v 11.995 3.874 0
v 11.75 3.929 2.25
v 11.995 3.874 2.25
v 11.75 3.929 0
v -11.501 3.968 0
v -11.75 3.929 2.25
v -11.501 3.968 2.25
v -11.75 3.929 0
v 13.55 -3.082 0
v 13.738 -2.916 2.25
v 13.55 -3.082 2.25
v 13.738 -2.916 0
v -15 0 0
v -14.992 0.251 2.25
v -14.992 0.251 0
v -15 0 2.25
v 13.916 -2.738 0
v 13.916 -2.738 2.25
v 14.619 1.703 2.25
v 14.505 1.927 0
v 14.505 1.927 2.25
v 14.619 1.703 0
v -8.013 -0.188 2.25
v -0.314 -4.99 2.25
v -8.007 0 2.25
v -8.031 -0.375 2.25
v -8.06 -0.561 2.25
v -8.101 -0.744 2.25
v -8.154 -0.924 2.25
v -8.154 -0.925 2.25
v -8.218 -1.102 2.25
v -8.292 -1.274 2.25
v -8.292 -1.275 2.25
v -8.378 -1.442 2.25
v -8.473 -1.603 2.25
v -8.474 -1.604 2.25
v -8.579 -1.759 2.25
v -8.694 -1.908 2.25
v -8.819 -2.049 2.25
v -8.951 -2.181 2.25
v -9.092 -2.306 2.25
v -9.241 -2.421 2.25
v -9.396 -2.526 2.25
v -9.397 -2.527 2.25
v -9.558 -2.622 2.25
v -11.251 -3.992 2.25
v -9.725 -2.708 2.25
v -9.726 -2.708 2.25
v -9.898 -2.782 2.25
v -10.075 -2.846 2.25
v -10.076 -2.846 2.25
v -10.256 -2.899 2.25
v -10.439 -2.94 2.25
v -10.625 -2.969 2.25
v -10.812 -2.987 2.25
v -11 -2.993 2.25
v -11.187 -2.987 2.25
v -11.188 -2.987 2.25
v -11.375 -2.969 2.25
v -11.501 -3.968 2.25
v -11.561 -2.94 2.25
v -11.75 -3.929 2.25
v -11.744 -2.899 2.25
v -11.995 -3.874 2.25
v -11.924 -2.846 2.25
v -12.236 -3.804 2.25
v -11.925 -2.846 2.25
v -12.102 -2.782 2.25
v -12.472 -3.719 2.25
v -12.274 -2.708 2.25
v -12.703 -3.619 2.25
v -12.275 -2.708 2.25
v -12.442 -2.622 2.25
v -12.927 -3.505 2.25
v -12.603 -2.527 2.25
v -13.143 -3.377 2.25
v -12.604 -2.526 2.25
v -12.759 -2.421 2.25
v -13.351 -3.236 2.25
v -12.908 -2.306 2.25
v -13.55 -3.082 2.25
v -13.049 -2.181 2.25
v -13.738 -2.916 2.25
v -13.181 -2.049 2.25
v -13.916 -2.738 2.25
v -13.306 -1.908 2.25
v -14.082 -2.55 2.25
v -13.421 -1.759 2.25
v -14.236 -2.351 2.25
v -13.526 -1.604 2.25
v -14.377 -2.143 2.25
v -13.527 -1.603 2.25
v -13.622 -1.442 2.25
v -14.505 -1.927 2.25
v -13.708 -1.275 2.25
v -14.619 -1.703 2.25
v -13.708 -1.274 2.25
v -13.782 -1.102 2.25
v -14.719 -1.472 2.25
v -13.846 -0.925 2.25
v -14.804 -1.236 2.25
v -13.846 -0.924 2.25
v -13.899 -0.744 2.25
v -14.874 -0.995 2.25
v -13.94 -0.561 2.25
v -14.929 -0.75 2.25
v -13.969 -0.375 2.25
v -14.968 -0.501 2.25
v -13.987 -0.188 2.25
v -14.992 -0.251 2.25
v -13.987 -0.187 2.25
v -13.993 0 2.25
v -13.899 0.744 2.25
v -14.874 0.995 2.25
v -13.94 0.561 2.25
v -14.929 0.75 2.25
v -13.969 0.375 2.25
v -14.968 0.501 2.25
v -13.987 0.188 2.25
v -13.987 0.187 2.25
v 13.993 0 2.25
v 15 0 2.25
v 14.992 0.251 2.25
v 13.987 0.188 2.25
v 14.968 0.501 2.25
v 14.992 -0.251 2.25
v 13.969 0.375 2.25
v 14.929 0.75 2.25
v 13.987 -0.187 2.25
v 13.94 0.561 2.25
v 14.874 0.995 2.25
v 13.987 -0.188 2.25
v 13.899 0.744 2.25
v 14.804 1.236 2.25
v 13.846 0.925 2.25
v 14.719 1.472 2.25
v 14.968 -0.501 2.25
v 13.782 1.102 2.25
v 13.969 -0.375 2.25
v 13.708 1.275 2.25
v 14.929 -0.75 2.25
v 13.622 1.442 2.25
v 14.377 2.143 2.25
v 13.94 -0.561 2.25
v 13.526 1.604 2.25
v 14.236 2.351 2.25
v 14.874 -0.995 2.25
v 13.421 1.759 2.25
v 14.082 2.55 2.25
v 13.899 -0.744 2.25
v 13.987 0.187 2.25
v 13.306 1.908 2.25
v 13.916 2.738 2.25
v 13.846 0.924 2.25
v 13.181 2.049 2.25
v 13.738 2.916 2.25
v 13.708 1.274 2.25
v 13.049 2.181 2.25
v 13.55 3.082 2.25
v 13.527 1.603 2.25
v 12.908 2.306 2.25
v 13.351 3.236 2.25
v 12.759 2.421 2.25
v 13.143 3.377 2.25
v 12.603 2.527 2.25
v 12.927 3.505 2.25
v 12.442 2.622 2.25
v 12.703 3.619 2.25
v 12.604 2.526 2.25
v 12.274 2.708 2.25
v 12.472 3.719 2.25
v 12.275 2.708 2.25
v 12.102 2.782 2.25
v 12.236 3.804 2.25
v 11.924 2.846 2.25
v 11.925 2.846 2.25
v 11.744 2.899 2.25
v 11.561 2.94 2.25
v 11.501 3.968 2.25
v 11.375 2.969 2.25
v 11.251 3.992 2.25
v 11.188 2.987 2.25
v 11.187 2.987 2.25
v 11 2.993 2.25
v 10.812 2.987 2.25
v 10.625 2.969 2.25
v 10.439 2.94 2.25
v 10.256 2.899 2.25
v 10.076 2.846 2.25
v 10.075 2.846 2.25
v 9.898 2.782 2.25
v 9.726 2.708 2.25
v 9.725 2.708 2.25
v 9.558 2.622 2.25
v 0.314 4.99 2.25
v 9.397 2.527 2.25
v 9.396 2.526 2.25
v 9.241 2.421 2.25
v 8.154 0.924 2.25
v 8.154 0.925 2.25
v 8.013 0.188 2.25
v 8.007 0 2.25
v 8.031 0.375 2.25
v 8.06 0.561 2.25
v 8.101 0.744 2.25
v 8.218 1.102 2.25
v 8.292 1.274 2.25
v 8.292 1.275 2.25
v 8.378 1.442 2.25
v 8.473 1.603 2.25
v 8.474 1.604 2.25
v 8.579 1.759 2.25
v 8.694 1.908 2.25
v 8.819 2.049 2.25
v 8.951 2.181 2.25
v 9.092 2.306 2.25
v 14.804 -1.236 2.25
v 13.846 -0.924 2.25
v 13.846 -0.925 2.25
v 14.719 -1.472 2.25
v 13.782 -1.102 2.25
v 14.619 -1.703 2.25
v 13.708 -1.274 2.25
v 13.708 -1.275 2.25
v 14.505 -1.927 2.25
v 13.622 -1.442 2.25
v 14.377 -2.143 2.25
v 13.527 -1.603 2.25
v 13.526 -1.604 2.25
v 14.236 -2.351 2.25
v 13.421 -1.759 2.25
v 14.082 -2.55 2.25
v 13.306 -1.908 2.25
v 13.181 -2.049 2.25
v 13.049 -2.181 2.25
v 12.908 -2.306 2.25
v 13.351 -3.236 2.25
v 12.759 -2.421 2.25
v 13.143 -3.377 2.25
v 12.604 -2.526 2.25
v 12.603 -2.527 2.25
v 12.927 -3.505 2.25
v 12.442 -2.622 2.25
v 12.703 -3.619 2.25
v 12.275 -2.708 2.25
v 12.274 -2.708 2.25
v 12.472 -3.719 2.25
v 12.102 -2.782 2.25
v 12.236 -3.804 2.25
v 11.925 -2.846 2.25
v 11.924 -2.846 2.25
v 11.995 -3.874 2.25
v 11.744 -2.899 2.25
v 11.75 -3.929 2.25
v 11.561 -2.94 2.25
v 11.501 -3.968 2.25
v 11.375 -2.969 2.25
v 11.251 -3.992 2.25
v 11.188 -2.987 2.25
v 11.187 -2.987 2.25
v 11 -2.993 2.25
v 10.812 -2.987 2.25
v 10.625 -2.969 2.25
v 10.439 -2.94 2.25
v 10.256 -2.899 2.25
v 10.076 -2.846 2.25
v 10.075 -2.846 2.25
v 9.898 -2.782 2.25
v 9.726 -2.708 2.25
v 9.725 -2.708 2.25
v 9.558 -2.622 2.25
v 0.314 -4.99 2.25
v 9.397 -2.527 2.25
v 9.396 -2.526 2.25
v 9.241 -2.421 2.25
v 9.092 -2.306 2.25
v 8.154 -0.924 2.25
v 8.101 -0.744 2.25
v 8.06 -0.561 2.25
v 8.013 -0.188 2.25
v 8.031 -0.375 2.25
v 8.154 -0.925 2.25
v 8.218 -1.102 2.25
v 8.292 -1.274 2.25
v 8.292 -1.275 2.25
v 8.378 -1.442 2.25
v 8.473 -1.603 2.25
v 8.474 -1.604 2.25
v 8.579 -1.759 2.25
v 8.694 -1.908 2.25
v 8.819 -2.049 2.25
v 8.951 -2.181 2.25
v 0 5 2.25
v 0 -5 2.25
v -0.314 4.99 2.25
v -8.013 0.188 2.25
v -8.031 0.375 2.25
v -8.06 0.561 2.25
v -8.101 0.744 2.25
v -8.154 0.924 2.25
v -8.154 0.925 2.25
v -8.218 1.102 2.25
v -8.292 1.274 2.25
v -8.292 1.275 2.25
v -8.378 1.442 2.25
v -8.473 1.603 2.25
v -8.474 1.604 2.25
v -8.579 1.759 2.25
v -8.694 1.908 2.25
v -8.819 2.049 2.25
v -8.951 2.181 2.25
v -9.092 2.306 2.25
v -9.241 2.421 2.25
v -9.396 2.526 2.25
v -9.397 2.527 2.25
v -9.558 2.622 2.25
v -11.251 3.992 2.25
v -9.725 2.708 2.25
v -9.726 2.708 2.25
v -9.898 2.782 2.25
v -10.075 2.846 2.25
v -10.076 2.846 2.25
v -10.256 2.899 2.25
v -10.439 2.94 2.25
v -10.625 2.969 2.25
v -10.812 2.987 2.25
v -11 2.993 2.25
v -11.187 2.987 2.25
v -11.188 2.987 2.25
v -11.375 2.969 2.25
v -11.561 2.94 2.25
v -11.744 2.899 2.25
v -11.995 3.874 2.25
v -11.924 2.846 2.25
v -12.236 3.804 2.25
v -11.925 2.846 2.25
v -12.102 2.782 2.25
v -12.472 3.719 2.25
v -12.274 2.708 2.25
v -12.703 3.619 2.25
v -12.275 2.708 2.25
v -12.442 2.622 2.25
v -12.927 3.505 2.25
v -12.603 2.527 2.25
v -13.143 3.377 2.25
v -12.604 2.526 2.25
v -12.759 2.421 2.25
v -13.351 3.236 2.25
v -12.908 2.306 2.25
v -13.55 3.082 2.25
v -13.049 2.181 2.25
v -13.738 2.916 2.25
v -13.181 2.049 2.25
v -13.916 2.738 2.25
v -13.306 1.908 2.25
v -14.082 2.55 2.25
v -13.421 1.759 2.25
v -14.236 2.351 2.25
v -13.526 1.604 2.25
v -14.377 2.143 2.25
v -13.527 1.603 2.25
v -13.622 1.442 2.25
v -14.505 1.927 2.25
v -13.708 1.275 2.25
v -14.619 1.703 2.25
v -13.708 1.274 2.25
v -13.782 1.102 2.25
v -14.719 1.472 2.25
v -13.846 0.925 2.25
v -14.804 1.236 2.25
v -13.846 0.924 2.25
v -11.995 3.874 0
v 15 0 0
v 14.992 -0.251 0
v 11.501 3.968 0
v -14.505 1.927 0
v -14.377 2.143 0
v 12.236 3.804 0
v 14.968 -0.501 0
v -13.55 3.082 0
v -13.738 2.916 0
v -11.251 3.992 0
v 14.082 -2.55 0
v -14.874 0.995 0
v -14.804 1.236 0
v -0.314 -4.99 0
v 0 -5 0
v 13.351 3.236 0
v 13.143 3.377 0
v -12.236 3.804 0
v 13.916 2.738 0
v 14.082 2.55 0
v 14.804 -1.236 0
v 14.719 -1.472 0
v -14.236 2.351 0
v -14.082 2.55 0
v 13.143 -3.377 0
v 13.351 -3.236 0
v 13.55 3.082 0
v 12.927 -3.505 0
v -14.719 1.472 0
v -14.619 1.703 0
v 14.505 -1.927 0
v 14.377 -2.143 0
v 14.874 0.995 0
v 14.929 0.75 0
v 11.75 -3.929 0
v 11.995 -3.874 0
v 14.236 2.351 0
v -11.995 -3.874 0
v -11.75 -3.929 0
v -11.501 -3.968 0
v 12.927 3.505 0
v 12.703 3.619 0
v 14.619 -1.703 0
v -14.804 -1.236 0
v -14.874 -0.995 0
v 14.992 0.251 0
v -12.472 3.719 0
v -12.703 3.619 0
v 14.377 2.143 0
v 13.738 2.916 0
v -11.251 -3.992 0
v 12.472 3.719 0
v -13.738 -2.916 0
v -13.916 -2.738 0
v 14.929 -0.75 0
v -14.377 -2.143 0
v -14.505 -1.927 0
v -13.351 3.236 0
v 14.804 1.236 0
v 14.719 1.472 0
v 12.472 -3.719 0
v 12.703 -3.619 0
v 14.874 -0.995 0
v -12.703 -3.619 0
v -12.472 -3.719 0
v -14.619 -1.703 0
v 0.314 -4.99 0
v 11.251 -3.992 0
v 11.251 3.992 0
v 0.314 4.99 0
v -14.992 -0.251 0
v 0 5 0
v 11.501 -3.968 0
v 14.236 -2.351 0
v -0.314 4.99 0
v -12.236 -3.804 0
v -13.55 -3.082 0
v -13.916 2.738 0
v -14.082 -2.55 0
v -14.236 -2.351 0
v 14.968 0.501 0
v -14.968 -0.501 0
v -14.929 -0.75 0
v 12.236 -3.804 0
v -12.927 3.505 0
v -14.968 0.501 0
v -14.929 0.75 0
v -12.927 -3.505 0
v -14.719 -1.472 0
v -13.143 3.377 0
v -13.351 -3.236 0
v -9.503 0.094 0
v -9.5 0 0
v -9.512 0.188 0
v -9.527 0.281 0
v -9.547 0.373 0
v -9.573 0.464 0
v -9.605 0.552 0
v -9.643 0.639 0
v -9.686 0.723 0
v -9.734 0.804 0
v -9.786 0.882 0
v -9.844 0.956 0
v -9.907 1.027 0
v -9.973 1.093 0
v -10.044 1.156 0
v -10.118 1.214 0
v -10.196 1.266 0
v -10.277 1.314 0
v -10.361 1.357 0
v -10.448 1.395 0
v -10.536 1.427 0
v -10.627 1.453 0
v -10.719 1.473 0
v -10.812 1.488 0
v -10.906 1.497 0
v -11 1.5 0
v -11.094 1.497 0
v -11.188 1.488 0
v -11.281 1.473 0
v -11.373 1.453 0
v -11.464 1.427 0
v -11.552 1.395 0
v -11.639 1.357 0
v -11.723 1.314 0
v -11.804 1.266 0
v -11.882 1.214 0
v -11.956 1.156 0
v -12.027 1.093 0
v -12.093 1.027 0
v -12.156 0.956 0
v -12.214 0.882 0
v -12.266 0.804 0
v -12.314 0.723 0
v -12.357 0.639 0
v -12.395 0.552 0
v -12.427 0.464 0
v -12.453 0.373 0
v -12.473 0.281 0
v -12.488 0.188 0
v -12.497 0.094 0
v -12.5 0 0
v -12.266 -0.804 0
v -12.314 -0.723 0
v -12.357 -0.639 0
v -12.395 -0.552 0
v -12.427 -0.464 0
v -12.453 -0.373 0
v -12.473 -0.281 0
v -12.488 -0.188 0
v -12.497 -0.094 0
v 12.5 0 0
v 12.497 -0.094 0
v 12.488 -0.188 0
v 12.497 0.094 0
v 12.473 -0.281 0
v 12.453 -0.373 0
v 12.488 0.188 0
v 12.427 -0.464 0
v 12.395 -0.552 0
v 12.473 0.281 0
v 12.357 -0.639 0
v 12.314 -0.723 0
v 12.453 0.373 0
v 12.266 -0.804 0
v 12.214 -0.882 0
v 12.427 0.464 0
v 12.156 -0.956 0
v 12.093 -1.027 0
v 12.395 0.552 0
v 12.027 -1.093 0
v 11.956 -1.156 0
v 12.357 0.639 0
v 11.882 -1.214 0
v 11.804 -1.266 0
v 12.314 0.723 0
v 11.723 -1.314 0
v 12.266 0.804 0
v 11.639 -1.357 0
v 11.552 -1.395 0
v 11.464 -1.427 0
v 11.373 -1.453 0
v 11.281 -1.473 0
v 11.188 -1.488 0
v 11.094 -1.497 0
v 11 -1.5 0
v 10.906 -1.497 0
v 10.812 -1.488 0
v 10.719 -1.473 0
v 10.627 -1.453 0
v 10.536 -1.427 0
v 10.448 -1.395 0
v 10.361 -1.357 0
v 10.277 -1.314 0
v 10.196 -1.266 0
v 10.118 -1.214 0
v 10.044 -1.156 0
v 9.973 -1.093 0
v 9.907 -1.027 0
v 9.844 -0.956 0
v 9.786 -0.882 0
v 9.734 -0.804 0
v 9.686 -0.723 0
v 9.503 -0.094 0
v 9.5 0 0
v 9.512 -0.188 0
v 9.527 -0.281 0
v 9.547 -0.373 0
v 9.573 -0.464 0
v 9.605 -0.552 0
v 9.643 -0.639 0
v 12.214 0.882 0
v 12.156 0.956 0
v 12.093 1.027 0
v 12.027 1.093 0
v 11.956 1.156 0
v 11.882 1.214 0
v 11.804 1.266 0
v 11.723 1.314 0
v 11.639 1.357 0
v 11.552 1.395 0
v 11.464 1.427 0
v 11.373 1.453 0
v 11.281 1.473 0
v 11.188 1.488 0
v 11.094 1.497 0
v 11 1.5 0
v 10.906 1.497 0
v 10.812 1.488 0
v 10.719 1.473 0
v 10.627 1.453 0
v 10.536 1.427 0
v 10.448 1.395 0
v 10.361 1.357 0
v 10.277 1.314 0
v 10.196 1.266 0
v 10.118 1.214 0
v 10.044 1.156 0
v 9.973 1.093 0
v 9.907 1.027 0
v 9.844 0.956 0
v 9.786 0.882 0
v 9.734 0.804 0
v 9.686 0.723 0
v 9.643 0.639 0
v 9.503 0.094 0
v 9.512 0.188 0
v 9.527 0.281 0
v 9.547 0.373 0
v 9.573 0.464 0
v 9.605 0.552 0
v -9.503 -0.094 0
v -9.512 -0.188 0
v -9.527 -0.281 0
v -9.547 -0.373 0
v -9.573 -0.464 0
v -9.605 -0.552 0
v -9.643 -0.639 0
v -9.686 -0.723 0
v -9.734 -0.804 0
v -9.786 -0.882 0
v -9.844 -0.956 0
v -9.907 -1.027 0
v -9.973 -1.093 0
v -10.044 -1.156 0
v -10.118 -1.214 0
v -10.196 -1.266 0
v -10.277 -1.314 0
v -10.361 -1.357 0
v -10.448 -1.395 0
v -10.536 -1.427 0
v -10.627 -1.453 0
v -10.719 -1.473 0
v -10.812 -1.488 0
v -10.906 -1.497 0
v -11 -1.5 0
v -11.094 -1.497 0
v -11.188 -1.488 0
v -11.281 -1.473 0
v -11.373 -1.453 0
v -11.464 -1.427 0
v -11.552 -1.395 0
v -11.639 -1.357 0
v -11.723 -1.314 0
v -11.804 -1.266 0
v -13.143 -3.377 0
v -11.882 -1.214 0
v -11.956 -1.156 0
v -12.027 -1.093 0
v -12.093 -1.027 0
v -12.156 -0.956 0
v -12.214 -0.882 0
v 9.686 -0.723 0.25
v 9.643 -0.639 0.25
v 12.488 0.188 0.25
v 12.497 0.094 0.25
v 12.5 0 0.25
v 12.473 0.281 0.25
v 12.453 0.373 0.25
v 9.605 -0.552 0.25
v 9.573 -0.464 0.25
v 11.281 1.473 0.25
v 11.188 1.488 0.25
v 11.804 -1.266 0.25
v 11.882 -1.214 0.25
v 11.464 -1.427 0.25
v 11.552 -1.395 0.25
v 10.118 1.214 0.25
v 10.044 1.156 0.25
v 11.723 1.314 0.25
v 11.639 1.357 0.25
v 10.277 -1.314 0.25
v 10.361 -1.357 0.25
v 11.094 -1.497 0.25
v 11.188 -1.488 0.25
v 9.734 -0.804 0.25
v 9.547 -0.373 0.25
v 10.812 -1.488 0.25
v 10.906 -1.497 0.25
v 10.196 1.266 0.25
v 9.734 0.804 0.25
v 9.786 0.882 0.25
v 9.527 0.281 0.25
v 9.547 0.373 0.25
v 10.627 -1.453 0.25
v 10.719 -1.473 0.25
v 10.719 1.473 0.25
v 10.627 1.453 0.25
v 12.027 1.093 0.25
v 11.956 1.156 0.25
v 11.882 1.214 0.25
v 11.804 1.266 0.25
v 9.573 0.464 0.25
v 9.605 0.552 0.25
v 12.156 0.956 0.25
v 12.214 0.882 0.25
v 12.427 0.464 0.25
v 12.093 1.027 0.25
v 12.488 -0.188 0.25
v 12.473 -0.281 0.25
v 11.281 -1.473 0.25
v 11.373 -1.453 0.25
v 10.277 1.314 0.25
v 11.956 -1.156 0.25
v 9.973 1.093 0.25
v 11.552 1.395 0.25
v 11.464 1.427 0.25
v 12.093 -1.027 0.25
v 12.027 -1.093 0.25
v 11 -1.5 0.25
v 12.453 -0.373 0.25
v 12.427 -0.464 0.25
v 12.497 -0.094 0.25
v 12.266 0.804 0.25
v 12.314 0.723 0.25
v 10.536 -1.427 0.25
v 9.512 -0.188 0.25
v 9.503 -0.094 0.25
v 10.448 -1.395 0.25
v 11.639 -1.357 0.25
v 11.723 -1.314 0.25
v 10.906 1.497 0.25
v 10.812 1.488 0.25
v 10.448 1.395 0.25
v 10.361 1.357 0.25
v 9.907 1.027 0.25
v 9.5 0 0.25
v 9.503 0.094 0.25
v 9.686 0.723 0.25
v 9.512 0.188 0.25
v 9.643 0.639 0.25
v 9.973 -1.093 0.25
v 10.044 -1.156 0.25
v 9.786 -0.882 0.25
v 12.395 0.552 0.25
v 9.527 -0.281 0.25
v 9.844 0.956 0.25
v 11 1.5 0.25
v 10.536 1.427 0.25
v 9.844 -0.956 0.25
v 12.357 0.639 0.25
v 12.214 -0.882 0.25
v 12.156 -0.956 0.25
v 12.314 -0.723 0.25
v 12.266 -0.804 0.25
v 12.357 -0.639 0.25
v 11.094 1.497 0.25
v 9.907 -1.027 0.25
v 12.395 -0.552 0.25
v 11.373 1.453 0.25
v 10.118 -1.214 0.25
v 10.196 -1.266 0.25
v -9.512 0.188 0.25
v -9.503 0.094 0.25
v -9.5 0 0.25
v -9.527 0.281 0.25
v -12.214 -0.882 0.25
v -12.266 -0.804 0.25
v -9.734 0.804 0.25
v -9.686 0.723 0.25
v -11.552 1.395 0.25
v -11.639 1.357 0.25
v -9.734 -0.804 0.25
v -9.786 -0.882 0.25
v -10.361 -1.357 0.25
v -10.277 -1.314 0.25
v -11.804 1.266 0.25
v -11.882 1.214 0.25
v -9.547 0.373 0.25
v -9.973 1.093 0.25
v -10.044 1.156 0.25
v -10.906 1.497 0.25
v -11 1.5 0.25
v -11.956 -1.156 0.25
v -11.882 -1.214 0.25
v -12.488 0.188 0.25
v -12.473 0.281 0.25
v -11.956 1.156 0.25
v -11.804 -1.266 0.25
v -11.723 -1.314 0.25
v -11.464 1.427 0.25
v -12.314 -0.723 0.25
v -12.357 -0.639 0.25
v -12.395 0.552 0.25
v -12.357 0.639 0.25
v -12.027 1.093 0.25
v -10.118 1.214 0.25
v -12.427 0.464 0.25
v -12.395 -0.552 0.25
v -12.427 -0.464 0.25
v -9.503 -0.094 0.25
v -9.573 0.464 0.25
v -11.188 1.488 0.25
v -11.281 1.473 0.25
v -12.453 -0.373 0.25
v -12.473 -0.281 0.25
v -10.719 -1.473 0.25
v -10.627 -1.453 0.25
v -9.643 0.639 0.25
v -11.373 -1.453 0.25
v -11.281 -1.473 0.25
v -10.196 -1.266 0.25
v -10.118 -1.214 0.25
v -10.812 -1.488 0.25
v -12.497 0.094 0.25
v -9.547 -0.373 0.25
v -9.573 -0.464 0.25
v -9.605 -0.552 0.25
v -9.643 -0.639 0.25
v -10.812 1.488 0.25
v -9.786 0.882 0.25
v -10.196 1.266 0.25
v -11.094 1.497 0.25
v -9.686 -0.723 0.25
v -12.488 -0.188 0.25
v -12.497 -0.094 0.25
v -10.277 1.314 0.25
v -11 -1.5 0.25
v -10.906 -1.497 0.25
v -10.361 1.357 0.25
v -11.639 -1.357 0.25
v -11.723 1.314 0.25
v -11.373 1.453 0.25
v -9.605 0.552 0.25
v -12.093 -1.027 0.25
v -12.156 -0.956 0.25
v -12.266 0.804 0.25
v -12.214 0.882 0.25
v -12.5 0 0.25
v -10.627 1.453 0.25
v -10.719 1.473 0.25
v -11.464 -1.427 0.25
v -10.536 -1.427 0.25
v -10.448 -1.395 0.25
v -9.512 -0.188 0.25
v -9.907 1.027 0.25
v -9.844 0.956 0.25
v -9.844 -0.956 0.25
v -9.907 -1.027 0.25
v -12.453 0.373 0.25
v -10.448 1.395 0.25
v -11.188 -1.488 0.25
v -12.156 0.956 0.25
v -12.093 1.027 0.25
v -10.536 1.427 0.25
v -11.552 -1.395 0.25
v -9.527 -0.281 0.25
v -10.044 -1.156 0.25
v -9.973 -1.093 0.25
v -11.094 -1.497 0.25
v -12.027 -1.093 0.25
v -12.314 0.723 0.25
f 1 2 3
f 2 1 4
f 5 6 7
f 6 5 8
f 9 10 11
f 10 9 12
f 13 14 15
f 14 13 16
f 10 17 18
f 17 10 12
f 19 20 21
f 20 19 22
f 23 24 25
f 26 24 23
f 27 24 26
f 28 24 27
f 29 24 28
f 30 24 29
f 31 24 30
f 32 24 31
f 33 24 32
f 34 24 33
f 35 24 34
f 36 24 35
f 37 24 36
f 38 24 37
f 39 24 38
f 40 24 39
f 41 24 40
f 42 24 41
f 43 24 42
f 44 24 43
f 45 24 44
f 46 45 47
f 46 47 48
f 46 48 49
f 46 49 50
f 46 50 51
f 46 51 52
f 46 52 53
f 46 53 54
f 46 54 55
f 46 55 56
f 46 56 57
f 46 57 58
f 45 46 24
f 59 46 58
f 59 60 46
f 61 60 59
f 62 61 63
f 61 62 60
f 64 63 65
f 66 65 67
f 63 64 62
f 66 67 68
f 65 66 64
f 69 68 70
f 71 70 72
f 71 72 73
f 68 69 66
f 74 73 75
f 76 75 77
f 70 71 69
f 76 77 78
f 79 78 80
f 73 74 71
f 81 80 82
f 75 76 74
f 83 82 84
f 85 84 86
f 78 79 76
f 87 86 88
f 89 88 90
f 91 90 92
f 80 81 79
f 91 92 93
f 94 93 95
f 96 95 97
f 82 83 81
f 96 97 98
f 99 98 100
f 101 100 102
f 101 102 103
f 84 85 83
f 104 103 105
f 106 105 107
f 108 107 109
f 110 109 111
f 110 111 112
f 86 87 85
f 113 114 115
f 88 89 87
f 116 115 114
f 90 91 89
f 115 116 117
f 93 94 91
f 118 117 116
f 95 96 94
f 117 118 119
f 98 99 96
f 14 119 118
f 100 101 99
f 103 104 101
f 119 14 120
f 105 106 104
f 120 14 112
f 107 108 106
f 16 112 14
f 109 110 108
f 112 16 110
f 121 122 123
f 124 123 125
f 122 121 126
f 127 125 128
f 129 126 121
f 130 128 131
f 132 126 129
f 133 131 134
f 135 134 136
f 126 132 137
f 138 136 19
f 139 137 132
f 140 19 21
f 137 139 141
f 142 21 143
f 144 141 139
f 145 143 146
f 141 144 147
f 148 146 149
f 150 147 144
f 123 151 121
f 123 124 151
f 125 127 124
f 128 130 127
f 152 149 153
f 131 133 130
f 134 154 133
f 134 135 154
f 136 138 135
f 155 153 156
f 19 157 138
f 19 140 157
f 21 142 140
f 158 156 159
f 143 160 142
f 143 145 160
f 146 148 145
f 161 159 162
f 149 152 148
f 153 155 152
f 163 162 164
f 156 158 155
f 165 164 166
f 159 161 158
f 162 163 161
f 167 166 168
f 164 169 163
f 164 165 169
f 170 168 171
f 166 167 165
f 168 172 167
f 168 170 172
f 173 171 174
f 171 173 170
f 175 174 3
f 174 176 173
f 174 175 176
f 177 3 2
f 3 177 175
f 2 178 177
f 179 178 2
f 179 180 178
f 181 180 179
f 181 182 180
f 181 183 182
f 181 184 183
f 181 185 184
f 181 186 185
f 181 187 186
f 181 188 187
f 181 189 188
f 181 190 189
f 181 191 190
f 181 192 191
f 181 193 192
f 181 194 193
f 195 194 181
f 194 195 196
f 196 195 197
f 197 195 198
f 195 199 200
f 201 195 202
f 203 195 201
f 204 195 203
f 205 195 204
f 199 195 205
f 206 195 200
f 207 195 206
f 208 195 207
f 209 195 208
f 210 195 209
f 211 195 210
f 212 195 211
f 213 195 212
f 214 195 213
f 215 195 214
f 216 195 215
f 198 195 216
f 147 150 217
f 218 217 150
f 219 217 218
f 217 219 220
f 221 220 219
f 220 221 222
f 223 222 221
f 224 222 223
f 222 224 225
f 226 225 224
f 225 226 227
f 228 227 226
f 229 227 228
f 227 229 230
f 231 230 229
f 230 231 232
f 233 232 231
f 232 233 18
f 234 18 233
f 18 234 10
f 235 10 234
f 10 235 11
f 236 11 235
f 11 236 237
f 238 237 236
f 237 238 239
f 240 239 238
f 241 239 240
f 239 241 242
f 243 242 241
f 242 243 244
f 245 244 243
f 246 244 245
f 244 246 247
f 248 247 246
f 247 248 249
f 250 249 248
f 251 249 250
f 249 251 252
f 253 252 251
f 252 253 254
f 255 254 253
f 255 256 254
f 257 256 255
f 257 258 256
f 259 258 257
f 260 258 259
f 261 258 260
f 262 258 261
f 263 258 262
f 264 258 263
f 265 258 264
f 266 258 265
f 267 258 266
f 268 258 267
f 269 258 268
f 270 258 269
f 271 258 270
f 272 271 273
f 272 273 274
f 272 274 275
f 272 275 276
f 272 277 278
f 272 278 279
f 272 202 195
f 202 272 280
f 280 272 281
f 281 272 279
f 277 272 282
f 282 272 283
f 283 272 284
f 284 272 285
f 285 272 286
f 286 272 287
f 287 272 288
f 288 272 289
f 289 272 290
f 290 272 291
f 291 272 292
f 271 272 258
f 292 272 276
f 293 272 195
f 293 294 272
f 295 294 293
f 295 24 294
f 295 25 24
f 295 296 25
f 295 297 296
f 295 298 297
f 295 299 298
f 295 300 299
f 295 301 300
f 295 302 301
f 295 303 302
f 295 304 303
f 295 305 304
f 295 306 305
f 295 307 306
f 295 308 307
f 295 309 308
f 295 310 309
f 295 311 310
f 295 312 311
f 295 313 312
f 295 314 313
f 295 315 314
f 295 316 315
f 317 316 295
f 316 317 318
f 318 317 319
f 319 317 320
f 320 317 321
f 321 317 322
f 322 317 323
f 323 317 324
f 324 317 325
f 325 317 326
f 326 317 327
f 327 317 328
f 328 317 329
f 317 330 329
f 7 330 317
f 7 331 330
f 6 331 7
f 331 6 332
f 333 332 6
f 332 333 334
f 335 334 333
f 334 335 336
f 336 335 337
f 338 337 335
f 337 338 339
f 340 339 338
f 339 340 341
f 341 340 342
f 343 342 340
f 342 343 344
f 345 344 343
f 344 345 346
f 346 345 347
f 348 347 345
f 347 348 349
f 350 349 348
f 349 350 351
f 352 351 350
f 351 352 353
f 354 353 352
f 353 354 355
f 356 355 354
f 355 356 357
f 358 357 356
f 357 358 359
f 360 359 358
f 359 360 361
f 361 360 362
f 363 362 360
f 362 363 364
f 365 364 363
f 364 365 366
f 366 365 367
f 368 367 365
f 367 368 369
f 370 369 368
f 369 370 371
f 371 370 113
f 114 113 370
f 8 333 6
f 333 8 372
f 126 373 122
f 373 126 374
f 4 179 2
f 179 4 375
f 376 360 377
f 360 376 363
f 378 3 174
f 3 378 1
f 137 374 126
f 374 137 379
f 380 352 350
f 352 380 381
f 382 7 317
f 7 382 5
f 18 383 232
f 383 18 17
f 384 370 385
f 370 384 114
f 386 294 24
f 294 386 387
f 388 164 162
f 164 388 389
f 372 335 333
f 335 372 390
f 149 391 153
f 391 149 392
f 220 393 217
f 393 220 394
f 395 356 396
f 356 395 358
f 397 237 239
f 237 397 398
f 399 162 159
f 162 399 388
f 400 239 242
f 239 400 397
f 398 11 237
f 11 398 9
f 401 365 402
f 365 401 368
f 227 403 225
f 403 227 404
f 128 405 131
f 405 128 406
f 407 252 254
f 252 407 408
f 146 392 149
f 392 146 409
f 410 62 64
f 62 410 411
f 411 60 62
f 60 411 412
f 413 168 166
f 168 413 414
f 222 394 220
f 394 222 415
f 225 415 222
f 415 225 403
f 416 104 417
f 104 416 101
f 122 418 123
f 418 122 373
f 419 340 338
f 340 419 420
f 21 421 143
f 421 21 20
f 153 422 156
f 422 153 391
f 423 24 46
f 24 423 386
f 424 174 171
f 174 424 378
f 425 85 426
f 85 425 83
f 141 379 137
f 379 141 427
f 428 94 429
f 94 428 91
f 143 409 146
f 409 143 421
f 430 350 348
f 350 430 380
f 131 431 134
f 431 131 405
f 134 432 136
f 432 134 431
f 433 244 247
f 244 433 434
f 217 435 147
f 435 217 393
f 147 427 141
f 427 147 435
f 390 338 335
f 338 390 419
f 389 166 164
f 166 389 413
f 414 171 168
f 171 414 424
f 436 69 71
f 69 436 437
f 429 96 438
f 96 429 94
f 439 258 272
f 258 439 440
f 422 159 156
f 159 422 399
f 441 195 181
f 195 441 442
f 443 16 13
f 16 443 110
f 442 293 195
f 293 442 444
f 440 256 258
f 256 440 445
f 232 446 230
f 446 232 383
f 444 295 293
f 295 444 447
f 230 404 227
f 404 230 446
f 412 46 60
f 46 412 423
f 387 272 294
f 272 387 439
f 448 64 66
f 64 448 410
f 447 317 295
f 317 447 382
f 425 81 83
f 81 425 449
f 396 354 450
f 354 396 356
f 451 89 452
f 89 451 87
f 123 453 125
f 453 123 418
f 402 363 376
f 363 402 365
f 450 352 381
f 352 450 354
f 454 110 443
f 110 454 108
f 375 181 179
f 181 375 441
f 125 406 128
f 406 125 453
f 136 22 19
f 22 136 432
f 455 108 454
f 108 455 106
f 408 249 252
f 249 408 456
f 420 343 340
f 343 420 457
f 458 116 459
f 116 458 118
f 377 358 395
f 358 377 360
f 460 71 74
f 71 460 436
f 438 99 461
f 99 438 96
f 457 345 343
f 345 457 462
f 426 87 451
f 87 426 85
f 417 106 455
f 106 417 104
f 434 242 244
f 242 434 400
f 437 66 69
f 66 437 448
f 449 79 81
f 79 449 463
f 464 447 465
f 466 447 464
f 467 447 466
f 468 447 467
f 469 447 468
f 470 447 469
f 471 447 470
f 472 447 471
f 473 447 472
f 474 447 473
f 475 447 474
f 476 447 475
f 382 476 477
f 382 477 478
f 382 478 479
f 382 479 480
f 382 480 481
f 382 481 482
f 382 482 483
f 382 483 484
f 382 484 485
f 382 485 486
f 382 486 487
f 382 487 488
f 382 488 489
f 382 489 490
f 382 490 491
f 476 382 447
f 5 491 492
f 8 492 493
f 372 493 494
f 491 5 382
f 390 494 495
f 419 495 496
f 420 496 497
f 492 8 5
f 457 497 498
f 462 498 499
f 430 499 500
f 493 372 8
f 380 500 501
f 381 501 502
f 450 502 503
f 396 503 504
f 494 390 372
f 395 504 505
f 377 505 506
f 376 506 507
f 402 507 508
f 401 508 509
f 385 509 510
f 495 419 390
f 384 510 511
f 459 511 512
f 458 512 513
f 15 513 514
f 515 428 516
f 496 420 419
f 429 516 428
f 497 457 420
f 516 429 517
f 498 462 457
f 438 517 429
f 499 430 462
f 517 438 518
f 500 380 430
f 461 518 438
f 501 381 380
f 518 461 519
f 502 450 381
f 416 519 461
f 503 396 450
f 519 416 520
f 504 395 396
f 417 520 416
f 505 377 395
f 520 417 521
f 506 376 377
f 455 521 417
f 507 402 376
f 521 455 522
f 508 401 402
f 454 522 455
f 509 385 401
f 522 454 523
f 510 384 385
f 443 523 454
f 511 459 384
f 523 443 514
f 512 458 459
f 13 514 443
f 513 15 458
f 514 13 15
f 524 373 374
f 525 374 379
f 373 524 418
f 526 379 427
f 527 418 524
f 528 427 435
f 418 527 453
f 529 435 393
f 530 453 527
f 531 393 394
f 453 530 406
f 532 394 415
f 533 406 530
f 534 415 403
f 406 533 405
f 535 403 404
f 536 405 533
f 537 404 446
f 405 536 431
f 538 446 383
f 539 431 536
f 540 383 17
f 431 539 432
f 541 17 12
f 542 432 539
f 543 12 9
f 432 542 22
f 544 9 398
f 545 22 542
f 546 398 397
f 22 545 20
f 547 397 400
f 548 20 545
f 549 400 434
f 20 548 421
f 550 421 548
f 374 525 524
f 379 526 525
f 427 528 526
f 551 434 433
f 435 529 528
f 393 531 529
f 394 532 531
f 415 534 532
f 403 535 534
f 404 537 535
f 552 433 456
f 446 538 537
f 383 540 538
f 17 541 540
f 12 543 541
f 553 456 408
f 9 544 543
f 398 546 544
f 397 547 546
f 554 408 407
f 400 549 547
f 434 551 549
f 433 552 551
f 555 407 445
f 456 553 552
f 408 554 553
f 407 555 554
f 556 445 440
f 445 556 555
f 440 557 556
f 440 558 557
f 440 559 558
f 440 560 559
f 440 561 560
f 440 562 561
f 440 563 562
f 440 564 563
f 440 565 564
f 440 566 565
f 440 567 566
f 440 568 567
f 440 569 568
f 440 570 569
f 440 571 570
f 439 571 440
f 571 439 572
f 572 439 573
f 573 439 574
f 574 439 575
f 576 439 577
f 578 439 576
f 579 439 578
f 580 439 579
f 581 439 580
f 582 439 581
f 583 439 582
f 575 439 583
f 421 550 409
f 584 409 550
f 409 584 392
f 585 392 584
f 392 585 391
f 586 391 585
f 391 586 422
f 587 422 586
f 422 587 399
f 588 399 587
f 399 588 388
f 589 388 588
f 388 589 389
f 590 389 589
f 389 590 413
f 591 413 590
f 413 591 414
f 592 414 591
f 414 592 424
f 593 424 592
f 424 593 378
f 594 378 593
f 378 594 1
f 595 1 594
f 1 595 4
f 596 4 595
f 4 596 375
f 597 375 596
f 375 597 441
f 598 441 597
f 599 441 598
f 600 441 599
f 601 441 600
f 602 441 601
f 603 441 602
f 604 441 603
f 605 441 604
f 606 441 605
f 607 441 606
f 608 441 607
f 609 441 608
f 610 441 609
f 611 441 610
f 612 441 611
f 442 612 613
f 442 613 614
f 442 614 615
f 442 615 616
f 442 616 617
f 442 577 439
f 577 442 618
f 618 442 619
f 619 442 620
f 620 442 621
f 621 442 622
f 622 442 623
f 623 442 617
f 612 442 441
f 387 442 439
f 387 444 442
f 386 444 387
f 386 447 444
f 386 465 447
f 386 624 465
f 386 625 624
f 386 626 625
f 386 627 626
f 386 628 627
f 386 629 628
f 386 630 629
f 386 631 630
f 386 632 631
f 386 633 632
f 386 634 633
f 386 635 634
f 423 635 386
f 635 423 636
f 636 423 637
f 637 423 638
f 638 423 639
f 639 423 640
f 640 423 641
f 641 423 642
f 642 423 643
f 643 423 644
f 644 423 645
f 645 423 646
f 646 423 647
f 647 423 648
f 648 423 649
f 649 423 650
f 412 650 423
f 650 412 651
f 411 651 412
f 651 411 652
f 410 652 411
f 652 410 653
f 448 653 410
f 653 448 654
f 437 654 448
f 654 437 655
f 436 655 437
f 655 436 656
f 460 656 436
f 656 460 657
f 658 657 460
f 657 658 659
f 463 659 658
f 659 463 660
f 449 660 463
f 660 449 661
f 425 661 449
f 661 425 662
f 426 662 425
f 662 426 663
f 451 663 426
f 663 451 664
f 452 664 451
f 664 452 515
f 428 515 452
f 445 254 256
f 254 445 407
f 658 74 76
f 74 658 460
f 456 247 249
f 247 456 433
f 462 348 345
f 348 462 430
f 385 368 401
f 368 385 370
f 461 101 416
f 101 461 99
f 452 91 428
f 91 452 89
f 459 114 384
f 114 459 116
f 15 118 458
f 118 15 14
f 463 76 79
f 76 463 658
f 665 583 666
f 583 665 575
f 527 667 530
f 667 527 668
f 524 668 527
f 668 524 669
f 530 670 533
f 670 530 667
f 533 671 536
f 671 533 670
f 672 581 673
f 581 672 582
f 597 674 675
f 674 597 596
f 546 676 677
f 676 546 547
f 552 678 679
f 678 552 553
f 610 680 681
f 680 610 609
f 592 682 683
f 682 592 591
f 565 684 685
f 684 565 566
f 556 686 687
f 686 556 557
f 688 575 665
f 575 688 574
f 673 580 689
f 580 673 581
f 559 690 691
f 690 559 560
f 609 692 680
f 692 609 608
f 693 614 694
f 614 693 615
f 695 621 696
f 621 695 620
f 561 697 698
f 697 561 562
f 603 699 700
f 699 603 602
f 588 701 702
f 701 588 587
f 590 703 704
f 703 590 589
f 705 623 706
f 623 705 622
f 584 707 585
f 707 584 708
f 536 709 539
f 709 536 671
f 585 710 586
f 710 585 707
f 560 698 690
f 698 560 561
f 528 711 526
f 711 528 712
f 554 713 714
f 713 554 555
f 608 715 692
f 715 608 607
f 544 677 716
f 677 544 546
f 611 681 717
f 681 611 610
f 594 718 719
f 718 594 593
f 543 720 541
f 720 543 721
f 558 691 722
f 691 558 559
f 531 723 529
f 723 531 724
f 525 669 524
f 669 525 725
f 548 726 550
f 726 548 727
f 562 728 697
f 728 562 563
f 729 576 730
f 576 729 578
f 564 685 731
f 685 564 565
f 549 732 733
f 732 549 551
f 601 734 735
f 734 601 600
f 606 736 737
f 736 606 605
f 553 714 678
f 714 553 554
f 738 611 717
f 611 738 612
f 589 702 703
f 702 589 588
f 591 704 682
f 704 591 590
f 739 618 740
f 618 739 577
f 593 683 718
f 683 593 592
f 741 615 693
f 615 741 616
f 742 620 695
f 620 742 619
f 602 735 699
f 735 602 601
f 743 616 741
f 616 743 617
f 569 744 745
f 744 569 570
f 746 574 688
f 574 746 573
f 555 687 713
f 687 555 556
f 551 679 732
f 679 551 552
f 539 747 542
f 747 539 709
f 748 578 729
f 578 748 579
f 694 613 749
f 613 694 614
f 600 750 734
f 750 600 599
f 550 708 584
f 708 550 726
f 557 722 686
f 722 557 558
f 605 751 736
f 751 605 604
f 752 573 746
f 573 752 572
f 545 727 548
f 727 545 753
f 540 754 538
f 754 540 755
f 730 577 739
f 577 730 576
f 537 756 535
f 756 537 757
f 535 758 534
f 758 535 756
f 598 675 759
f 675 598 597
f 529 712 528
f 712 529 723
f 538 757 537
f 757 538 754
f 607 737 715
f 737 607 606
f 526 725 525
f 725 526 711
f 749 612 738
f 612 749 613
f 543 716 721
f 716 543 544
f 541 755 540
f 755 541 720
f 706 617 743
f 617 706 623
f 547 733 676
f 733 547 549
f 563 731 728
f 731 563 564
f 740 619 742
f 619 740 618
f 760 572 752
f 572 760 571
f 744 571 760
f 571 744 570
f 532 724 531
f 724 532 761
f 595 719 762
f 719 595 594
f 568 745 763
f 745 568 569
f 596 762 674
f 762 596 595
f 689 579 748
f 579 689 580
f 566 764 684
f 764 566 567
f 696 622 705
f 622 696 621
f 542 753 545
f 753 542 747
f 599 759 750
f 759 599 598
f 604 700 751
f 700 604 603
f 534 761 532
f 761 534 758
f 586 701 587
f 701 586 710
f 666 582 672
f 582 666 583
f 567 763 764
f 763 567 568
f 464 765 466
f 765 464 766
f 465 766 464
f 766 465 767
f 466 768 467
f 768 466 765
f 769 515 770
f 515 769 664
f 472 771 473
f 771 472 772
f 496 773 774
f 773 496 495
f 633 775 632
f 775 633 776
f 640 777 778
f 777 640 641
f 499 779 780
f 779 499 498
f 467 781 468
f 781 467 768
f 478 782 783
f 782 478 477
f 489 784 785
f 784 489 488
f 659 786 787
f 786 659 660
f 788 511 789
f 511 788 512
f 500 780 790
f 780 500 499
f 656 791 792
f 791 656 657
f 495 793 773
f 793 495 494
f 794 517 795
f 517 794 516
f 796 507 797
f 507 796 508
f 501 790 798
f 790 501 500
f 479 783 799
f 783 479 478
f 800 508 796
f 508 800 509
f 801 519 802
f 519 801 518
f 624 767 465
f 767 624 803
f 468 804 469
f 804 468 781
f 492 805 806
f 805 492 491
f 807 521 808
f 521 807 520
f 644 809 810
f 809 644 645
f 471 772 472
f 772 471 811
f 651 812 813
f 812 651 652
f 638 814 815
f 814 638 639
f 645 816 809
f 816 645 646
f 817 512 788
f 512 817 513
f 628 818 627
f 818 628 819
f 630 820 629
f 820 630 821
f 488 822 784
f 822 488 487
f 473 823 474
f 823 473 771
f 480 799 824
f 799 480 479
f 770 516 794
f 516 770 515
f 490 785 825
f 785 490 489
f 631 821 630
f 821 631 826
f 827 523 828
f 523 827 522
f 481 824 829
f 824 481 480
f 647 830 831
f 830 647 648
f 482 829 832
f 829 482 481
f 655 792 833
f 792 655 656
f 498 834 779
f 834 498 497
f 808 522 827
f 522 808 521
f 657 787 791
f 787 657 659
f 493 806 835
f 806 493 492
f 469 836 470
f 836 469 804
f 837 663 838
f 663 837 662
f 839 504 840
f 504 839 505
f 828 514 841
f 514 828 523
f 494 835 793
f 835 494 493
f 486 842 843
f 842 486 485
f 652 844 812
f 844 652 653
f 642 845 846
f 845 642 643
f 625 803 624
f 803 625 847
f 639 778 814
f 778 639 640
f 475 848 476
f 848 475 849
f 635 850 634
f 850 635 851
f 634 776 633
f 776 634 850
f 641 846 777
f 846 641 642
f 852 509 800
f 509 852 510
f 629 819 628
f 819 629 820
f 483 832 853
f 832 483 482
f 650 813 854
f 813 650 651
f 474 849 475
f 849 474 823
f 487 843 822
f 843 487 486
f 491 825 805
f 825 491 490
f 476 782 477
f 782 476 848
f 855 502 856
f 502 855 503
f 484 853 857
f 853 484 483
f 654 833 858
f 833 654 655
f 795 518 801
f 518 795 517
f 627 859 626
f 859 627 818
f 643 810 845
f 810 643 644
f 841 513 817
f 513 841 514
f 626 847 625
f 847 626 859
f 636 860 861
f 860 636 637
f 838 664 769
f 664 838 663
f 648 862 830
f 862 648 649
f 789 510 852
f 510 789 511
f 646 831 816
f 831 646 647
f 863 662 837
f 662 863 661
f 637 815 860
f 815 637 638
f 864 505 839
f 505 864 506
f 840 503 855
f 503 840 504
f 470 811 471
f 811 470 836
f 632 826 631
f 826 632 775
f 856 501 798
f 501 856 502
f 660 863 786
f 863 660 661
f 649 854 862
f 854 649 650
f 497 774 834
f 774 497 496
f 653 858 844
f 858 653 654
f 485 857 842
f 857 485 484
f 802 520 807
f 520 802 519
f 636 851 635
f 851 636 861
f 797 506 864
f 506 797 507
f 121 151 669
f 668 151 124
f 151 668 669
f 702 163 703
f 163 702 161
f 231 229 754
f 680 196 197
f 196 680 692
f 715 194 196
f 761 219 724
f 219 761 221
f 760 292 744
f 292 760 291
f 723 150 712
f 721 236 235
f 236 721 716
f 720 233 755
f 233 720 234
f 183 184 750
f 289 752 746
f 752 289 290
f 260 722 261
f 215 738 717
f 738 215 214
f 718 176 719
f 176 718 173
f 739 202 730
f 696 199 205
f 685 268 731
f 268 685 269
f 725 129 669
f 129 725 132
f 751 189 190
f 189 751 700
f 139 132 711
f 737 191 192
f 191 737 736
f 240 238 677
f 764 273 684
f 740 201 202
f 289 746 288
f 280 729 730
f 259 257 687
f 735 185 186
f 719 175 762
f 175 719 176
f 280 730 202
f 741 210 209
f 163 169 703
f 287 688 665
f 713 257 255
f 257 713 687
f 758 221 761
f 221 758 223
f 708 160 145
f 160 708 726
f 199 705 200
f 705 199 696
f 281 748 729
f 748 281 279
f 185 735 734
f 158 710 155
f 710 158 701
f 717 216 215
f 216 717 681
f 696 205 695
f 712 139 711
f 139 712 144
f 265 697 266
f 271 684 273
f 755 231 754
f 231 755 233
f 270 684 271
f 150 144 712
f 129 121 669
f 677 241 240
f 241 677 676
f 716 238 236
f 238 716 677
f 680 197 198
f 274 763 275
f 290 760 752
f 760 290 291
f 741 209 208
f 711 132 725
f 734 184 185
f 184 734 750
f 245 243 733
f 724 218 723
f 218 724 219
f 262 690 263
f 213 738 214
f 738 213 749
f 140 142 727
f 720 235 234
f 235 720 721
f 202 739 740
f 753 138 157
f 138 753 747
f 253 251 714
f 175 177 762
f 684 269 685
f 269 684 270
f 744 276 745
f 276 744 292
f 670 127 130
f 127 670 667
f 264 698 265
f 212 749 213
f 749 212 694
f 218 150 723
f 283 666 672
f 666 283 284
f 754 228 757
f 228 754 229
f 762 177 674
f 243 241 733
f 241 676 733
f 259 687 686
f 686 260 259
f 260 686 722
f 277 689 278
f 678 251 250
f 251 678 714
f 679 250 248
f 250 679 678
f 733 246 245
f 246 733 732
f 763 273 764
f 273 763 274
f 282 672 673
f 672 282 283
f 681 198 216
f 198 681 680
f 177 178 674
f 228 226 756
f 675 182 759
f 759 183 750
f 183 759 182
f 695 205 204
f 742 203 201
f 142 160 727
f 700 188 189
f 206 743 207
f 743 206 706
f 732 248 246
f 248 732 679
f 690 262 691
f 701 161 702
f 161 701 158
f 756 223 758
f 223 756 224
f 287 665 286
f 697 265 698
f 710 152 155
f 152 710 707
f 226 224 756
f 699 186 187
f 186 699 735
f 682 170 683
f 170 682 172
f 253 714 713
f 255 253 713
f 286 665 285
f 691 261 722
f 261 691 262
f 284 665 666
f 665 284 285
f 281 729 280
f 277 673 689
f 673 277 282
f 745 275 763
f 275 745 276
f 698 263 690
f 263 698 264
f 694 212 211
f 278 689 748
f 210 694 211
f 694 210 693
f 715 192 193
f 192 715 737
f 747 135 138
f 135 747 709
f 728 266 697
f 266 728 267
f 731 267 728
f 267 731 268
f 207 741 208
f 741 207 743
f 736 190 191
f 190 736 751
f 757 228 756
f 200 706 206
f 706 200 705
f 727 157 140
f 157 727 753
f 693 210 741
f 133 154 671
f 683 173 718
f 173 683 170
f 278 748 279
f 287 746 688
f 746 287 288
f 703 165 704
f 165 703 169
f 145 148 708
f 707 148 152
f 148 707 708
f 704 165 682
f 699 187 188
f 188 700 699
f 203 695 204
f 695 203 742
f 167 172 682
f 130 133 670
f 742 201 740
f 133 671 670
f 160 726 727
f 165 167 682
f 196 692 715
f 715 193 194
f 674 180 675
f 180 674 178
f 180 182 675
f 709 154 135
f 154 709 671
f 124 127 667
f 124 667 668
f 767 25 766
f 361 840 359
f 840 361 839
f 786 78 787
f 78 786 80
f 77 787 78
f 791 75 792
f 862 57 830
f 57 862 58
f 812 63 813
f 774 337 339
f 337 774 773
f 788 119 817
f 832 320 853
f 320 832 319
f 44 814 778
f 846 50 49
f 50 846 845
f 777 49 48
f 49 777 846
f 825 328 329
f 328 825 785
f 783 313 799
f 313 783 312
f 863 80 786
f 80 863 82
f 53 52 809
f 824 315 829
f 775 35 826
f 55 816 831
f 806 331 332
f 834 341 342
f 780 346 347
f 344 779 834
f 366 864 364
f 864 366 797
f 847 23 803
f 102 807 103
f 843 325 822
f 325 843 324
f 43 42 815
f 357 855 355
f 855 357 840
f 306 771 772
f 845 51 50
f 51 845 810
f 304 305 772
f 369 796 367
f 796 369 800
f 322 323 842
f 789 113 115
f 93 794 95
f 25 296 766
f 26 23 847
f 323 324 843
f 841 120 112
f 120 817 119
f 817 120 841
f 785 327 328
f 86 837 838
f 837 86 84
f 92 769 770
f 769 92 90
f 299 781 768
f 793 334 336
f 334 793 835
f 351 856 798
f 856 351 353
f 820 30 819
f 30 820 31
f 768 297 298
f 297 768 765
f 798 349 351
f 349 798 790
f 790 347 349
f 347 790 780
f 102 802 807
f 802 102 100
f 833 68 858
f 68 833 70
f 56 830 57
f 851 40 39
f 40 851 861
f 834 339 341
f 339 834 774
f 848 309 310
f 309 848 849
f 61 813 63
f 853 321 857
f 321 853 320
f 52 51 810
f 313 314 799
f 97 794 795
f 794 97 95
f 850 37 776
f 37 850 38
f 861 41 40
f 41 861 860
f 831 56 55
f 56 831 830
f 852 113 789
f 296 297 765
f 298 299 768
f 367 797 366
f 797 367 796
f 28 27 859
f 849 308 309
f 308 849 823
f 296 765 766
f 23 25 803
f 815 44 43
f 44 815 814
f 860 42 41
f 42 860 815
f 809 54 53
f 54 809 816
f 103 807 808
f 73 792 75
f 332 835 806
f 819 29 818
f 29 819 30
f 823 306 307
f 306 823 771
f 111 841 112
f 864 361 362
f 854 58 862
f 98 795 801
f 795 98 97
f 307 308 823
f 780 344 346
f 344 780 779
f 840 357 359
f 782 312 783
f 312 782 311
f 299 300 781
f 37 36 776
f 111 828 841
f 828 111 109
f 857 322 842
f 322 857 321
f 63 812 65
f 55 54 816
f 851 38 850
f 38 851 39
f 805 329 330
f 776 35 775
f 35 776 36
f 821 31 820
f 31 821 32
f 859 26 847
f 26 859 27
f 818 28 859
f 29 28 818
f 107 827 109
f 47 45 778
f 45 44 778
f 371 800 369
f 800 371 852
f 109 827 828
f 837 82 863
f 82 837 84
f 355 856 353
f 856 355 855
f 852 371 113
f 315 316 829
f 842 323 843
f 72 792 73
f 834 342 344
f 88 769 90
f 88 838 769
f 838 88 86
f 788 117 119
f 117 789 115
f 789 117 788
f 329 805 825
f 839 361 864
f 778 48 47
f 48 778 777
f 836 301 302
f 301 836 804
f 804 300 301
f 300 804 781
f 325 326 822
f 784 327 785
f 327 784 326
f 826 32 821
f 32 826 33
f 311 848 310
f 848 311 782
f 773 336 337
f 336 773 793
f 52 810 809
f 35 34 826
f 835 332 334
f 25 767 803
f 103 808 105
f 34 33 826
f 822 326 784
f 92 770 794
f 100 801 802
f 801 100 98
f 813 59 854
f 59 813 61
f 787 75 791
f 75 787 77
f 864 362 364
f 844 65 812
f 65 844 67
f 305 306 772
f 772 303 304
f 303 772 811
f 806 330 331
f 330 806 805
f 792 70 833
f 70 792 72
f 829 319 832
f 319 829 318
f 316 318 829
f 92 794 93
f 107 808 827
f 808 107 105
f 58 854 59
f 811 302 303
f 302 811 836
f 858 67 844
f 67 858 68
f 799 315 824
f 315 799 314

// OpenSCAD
r_tige=5;
r_cote=4;
r_m3=1.5;
tete_vis=3;
ecart=11;
hauteur=2.25;

module blocage_arbre_y(){
	difference(){
		hull(){
			cylinder(h=hauteur, r=r_tige, $fn=100);
			translate([ecart,0,0]){cylinder(h=hauteur, r=r_cote, $fn=100);}
			translate([-ecart,0,0]){cylinder(h=hauteur, r=r_cote, $fn=100);}
		}
		translate([ecart,0,-5]){cylinder(h=hauteur+10, r=r_m3, $fn=100);}
		translate([-ecart,0,-5]){cylinder(h=hauteur+10, r=r_m3, $fn=100);}

		translate([ecart,0,hauteur-2]){cylinder(h=2.01, r1=r_m3, r2=tete_vis, $fn=100);}
		translate([-ecart,0,hauteur-2]){cylinder(h=2.01, r1=r_m3, r2=tete_vis, $fn=100);}

	}

}

blocage_arbre_y();
